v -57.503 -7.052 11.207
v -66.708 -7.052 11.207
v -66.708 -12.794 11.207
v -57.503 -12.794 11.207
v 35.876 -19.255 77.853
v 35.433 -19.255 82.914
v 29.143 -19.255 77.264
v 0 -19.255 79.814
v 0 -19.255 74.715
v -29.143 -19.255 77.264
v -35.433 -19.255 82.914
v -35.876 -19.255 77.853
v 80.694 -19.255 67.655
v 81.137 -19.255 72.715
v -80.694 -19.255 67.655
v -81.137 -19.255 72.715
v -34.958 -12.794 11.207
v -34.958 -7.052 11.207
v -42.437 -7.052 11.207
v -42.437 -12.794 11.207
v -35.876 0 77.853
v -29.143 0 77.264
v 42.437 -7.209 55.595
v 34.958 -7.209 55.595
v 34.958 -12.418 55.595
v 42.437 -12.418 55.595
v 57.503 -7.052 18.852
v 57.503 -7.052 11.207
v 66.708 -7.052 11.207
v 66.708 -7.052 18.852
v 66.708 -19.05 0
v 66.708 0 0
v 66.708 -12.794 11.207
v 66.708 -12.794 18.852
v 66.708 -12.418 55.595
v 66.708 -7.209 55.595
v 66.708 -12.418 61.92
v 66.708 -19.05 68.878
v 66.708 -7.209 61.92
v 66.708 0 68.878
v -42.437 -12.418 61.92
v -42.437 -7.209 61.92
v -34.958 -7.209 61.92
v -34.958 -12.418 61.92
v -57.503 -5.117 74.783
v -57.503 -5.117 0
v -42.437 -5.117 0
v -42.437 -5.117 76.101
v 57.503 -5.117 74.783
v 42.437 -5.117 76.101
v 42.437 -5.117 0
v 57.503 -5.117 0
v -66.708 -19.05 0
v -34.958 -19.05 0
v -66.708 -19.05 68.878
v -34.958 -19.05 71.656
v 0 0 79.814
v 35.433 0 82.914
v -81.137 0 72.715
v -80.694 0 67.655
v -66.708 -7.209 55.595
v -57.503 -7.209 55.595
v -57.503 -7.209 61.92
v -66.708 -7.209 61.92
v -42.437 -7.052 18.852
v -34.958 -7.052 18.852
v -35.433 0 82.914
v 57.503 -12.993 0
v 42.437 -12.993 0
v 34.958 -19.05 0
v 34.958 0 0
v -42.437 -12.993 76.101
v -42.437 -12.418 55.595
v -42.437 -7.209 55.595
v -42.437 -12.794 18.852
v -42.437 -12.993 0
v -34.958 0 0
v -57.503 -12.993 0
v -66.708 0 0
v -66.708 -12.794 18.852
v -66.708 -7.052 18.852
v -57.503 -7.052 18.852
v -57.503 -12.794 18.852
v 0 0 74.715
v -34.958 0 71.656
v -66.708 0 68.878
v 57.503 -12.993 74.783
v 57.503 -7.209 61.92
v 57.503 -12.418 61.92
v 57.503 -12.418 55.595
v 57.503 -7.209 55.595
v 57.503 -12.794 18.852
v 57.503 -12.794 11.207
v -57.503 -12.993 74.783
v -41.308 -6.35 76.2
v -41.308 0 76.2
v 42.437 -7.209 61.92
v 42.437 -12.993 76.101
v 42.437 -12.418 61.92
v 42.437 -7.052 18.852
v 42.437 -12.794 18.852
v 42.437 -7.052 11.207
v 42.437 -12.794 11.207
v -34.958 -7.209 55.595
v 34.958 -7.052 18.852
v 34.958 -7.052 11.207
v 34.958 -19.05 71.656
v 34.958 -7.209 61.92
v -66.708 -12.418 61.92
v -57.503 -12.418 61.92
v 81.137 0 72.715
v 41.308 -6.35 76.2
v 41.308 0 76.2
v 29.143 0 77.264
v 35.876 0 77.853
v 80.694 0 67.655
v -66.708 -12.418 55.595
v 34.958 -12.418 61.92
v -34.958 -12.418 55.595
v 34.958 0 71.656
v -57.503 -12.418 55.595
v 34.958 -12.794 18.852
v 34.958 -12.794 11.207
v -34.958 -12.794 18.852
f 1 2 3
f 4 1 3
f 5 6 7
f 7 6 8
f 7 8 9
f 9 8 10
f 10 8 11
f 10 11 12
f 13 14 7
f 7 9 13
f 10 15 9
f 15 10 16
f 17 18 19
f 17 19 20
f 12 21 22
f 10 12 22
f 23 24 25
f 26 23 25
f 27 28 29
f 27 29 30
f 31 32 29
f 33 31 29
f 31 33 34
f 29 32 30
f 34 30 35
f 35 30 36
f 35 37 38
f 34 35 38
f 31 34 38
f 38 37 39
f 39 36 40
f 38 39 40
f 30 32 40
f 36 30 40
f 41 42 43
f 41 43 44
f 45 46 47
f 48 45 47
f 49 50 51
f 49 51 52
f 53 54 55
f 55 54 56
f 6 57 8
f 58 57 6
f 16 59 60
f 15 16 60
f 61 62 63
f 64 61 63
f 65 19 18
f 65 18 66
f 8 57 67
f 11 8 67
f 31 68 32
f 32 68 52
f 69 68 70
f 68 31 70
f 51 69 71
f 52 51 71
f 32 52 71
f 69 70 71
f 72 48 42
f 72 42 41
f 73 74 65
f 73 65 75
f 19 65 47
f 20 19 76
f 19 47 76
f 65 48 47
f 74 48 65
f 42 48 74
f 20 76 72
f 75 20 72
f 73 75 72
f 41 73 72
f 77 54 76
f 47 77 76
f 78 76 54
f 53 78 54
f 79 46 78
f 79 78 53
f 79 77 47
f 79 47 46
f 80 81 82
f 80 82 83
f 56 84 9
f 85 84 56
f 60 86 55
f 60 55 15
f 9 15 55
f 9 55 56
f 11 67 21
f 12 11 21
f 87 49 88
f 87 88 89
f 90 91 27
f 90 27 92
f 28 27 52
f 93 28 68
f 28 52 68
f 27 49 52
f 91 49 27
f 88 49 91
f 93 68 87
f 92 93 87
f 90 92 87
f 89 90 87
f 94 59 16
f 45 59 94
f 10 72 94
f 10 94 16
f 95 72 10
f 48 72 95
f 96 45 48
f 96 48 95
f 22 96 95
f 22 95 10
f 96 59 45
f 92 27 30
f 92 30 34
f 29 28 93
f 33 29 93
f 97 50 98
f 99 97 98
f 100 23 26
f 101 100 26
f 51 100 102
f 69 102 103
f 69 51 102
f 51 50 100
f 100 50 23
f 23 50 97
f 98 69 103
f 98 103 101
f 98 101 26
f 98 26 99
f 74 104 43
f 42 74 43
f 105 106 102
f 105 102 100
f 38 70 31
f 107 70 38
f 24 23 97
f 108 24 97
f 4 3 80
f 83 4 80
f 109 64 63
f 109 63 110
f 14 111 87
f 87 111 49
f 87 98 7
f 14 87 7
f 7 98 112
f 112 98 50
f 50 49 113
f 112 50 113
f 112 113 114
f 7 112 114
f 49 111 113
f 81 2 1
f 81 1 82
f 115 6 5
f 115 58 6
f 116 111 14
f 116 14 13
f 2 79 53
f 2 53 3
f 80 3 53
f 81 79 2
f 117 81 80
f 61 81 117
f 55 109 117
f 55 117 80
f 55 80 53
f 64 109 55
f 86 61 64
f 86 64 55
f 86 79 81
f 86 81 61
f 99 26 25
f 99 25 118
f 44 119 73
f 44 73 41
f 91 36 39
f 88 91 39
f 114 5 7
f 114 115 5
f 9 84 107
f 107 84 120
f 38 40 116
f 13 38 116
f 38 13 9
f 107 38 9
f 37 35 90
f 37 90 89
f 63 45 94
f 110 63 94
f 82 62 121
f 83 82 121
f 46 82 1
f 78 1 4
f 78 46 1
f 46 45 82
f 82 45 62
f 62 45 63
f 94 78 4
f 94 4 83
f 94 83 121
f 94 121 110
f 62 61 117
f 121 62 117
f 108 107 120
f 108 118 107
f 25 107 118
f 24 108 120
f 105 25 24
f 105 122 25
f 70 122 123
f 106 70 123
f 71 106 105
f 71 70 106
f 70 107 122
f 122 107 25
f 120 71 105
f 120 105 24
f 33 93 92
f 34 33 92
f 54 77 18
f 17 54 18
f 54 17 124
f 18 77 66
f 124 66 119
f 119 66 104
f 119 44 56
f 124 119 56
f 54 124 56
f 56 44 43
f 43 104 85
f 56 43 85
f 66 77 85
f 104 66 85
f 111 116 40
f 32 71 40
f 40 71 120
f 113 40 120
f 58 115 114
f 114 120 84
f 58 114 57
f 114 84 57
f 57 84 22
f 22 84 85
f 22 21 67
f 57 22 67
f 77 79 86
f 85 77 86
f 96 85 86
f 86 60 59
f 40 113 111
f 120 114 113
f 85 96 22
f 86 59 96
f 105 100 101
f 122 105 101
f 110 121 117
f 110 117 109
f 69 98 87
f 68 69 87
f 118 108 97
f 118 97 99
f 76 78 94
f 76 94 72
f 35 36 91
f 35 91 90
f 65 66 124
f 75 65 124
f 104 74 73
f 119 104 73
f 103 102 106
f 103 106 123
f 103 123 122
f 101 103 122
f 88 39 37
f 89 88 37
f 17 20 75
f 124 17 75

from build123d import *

# Parameters (mm, degrees)
F0_W      = 6.35
F0_H      = 6.35
F1_DEPTH  = 76.2
F3_W      = 78.9158530533
F3_H      = 6.5545327961
F4_DEPTH  = 5.08
F5_DEPTH  = 38.1
F7_DEPTH  = 25.4
F8_DEPTH  = 25.4
F9_DEPTH  = 12.7
F10_DEPTH = 12.7
F11_W     = 15.0663554668
F11_H     = 7.8755952418
F12_DEPTH = 88.9
F13_W     = 5.7417834178
F13_H     = 7.6454
F14_DEPTH = 2540
F15_W     = 5.208699964
F15_H     = 6.3248500228
F16_DEPTH = 25400


# Not quite as in the source:
# - a feature names something its author has since deleted; it is built from what else it names


with BuildPart() as f1:
    # F0 (on Top) → F1 (new body)
    with BuildSketch(Plane.XY):
        with Locations((-38.1329911691, -3.175)):
            Rectangle(F0_W, F0_H)
    extrude(amount=F1_DEPTH)

    # F3 (on face) → F4 (join)
    with BuildSketch(Plane(origin=(-6.9297761713, 0, 79.2077040846), x_dir=(0.9961946981, 0, 0.0871557427), z_dir=(0.0871557427, 0, -0.9961946981))):
        with Locations((3.0671004206, 3.2772663981)):
            Rectangle(F3_W, F3_H)
    extrude(amount=F4_DEPTH)

    # F5 (add): a face of the model
    f5_faces = [f1.faces().sort_by_distance(p)[0] for p in [
        (-42.9607486108, -3.2772663981, 73.5057000729),
    ]]
    extrude(f5_faces, amount=F5_DEPTH)

    # F6: F1 across plane


with BuildPart() as f1_1:
    add(f1.part)
    add(f1.part.mirror(Plane.YZ))

    # F7 (add): a face of the model
    f7_faces = [f1_1.faces().sort_by_distance(p)[0] for p in [
        (-41.3079911691, -3.175, 35.5502976126),
    ]]
    extrude(f7_faces, amount=F7_DEPTH)

    # F8 (add): a face of the model
    f8_faces = [f1_1.faces().sort_by_distance(p)[0] for p in [
        (41.3079911691, -3.175, 35.5502976126),
    ]]
    extrude(f8_faces, amount=F8_DEPTH)

    # F9 (add): a face of the model
    f9_faces = [f1_1.faces().sort_by_distance(p)[0] for p in [
        (0, -6.5545327961, 75.0015171841),
    ]]
    extrude(f9_faces, amount=F9_DEPTH)

    # F10 (add): faces of the model
    f10_faces = [f1_1.faces().sort_by_distance(p)[0] for p in [
        (-50.72839761, -6.35, 35.1382082279),
        (50.72839761, -6.35, 35.1382082279),
    ]]
    extrude(f10_faces, amount=F10_DEPTH)

    # F11 (on face) → F12 (cut)
    with BuildSketch(Plane(origin=(0, 0, 0), x_dir=(1, 0, 0), z_dir=(0, 0, -1))):
        with Locations((-49.9696880579, 9.0547855943)):
            Rectangle(F11_W, F11_H)
        with Locations((49.9696880579, 9.0547855943)):
            Rectangle(F11_W, F11_H)
    extrude(amount=-F12_DEPTH, mode=Mode.SUBTRACT)

    # F13 (on face) → F14 (cut)
    with BuildSketch(Plane(origin=(-66.7079911691, 0, 0), x_dir=(0, -1, 0), z_dir=(-1, 0, 0))):
        with Locations((9.922655765, 15.0297441246)):
            Rectangle(F13_W, F13_H)
    extrude(amount=-F14_DEPTH, mode=Mode.SUBTRACT)

    # F15 (on face) → F16 (cut)
    with BuildSketch(Plane(origin=(-66.7079911691, 0, 0), x_dir=(0, -1, 0), z_dir=(-1, 0, 0))):
        with Locations((9.8132924177, 58.757327497)):
            Rectangle(F15_W, F15_H)
    extrude(amount=-F16_DEPTH, mode=Mode.SUBTRACT)


solid = f1_1.part
